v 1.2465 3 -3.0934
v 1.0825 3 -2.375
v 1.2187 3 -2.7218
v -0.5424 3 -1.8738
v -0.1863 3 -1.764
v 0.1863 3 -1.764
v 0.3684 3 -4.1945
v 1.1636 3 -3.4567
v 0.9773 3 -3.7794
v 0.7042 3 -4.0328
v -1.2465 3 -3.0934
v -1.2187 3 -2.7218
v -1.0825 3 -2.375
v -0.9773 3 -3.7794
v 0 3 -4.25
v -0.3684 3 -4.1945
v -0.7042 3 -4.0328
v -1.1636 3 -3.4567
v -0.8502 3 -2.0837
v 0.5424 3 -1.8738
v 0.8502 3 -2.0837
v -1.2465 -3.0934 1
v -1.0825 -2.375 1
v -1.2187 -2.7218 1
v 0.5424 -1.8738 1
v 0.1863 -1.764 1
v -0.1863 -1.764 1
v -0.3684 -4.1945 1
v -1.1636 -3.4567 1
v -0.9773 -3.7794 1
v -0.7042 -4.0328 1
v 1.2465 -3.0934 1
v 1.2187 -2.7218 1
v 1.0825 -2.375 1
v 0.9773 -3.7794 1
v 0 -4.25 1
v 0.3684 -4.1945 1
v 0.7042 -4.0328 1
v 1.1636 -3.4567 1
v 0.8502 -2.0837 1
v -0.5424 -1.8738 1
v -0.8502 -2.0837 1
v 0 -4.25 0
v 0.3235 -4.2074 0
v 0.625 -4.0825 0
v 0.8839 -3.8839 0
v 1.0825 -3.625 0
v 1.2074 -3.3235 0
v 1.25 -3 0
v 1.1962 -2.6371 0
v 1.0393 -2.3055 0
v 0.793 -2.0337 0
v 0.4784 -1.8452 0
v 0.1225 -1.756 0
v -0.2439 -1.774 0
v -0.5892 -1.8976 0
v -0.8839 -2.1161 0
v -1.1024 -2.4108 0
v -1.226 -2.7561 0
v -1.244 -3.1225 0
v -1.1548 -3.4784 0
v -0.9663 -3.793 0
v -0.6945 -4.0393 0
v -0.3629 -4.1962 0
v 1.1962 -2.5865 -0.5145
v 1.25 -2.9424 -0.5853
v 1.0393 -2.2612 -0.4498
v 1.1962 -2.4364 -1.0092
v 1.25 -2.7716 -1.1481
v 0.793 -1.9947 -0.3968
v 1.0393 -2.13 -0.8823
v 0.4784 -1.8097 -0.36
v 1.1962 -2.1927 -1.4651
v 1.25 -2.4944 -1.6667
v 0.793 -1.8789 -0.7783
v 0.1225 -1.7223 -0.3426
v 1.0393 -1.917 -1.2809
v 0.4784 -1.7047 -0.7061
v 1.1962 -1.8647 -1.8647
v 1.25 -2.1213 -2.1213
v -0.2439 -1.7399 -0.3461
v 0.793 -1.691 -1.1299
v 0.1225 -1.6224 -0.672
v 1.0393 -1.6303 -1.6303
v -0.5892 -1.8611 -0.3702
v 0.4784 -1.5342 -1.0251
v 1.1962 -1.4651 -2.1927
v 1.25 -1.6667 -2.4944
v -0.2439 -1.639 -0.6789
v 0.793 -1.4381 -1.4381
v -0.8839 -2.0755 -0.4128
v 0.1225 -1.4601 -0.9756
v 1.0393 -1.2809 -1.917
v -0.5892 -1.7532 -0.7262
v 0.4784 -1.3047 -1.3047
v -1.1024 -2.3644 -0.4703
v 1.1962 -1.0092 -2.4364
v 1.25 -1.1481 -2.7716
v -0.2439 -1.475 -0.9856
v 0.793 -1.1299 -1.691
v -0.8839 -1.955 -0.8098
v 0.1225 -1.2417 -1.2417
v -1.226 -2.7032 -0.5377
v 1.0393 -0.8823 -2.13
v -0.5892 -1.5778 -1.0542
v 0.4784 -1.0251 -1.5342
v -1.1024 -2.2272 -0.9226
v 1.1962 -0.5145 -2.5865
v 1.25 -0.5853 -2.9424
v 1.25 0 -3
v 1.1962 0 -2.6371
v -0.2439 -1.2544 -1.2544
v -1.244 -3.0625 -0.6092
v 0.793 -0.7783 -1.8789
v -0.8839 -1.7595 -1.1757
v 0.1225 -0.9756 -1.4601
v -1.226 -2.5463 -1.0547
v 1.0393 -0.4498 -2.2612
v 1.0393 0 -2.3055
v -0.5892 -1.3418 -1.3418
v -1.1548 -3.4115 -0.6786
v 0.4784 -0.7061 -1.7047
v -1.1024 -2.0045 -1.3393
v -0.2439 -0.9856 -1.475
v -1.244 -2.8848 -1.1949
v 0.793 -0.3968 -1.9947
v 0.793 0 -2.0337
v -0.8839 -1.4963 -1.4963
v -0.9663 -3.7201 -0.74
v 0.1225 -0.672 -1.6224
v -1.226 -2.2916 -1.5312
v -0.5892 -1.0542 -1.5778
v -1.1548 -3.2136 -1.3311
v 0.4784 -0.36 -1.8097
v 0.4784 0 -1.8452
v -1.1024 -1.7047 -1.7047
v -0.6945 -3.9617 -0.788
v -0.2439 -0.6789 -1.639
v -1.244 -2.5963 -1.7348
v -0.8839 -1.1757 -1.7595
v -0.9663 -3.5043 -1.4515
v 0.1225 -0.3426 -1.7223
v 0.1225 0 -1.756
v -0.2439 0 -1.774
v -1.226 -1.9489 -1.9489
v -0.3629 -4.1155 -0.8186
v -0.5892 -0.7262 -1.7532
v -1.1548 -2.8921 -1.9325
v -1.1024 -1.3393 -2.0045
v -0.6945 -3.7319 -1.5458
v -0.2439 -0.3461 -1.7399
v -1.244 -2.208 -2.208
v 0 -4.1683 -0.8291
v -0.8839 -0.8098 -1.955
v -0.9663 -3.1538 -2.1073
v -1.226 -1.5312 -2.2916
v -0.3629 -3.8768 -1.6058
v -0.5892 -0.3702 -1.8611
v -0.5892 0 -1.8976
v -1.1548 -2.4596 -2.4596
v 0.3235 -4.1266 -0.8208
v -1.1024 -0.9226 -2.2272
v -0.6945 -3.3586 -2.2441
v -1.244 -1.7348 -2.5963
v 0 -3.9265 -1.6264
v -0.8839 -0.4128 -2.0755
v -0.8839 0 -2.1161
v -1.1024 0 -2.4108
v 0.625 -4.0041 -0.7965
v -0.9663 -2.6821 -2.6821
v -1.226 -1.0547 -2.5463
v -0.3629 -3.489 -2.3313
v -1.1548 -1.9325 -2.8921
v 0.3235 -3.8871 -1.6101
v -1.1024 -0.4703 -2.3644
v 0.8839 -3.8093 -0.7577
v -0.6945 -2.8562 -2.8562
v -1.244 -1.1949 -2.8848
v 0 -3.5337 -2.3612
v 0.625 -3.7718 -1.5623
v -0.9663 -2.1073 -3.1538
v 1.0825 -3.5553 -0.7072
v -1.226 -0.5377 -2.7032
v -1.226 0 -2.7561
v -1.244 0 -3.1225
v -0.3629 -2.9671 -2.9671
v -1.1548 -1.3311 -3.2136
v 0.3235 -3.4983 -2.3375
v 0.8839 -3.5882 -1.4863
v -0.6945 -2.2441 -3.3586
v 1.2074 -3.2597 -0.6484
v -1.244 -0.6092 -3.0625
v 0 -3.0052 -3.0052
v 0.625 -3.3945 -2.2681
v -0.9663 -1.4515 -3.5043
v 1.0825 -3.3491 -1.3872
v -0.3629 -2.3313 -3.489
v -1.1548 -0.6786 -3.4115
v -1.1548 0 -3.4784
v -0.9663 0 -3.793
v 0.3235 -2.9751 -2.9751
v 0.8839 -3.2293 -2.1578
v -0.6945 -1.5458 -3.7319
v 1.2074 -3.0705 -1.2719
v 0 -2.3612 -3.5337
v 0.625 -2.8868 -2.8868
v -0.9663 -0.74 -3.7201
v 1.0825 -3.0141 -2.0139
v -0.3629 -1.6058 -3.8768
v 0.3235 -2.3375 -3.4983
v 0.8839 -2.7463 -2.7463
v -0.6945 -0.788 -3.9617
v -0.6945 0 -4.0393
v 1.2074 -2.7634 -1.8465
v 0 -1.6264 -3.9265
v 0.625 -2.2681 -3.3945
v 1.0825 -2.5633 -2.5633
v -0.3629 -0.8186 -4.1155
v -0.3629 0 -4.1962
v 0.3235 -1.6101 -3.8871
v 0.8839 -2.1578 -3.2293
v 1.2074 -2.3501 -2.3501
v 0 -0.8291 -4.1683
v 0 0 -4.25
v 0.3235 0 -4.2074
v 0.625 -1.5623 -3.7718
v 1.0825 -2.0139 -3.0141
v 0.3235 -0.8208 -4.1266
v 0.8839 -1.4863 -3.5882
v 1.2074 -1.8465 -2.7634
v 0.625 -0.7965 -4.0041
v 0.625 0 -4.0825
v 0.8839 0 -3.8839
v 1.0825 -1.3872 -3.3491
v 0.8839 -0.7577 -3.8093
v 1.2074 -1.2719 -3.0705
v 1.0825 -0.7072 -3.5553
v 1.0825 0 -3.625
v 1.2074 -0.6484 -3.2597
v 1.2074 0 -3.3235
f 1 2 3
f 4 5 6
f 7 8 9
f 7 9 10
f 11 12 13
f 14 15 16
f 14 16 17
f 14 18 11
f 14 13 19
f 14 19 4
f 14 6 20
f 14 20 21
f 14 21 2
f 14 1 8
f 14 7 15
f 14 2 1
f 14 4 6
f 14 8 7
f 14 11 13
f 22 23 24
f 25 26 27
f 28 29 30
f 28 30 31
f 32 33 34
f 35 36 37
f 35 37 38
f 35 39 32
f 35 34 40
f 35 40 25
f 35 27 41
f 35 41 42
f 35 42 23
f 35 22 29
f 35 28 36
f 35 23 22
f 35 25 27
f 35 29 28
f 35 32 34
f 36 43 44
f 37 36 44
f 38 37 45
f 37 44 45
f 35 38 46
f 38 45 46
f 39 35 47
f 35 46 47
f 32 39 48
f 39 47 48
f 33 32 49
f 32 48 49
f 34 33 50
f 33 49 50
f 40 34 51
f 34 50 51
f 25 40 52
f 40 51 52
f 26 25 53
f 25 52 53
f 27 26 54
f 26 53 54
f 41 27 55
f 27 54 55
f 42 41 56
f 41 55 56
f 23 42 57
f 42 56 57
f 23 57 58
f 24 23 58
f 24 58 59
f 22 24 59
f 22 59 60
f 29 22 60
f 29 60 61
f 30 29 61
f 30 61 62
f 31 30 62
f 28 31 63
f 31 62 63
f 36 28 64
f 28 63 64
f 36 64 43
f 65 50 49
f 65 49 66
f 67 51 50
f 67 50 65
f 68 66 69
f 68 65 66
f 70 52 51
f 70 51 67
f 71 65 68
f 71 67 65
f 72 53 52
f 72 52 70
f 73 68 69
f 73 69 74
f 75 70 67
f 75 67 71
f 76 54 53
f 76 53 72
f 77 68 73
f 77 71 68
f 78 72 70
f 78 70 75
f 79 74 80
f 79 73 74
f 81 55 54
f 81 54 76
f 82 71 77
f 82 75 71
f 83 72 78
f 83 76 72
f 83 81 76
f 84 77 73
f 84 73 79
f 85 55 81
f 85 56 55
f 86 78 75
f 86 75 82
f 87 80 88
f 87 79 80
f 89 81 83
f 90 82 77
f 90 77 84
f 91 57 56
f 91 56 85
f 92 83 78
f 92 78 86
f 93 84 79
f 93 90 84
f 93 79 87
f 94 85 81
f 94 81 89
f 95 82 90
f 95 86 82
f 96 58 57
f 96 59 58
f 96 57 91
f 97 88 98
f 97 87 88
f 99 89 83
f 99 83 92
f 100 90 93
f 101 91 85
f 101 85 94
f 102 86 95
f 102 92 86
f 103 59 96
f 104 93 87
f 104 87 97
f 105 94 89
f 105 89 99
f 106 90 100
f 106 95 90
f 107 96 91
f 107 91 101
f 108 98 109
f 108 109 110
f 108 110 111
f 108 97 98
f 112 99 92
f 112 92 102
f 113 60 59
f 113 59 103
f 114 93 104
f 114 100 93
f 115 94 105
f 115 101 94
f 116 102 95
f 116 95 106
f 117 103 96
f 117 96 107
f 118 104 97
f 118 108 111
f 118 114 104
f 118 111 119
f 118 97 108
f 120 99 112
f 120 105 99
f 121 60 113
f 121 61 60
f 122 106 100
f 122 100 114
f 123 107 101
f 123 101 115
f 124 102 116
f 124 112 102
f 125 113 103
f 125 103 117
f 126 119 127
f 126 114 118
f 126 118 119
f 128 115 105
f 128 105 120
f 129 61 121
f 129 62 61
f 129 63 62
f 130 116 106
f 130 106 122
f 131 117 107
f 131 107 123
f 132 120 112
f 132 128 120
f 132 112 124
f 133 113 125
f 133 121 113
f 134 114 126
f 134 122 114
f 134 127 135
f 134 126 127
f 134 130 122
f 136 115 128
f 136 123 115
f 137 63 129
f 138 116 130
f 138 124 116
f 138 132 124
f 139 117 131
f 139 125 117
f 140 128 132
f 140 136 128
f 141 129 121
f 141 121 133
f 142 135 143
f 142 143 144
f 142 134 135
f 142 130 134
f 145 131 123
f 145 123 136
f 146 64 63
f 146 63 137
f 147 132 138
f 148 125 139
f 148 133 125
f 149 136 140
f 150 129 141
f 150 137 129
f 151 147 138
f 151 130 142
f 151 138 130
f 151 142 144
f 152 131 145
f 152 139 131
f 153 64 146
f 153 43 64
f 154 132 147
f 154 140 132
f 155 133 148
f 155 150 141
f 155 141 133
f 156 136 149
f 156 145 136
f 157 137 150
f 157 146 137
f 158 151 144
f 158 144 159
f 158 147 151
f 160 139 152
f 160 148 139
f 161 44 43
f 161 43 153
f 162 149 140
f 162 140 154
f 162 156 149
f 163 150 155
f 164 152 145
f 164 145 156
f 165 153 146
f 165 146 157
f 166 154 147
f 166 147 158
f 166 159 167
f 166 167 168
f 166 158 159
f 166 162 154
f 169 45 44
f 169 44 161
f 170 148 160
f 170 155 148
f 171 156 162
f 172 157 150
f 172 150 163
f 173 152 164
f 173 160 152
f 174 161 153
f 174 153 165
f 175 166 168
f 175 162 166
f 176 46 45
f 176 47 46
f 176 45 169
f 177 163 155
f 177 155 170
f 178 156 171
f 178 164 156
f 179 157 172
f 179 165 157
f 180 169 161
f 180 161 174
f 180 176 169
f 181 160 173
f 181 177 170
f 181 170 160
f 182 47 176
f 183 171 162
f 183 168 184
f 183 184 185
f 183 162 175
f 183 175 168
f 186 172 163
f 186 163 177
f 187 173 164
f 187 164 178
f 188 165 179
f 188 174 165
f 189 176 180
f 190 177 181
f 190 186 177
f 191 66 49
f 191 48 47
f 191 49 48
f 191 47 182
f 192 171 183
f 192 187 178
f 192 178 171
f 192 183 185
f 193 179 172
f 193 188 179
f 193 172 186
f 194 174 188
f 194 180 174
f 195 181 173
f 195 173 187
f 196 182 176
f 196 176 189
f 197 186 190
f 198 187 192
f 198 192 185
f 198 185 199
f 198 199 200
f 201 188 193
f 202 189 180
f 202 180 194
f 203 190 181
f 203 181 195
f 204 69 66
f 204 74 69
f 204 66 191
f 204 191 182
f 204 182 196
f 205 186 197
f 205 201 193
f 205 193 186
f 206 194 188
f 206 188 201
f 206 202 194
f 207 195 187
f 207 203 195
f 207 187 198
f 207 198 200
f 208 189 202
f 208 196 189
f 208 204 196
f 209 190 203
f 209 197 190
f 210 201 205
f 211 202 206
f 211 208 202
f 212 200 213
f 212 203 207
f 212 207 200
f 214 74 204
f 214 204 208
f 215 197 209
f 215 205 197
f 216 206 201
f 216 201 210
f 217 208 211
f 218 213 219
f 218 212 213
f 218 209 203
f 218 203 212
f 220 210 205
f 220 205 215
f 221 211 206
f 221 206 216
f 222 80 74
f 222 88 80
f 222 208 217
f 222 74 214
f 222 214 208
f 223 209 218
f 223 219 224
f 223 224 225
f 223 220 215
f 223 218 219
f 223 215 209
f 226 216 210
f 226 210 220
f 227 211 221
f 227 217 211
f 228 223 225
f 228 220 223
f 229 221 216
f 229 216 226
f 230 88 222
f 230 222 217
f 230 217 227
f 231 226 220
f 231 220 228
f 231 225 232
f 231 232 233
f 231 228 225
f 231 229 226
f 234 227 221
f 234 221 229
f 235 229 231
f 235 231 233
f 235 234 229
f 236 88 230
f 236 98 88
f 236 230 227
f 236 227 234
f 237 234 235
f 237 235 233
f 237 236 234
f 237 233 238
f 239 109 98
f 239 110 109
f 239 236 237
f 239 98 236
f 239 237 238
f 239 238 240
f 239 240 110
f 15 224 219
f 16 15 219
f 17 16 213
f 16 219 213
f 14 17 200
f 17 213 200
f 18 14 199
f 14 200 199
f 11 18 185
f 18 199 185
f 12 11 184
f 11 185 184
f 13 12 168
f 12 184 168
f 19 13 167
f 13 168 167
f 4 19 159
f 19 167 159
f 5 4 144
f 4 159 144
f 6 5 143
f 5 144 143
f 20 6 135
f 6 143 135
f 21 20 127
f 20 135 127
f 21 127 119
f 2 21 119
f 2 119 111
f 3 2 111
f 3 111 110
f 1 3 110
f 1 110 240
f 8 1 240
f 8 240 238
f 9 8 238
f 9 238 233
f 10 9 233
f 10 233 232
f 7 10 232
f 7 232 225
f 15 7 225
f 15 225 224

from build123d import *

# Parameters (mm, degrees)
ESQUISSE5_R        = 1.25
R_VOLUTION1_ANGLE  = 90
ESQUISSE6_R        = 1.25
BOSS_EXTRU_3_DEPTH = 1
ESQUISSE7_R        = 1.25
BOSS_EXTRU_4_DEPTH = 3


with BuildPart() as part:
    # Esquisse5 → Révolution1 (revolve)
    with BuildSketch(Plane.XY):
        with Locations((0, -3)):
            Circle(ESQUISSE5_R)
    revolve(axis=Axis((-1.070799248, 0, 0), (1, 0, 0)), revolution_arc=R_VOLUTION1_ANGLE)

    # Esquisse6 → Boss.-Extru.3 (add)
    with BuildSketch(Plane.XY):
        with Locations(Location((0, -3, 0), (0, 0, 270))):
            Circle(ESQUISSE6_R)
    extrude(amount=BOSS_EXTRU_3_DEPTH)

    # Esquisse7 → Boss.-Extru.4 (add)
    with BuildSketch(Plane(origin=(0, 0, 0), x_dir=(1, 0, 0), z_dir=(0, 1, 0))):
        with Locations(Location((0, 3, 0), (0, 0, 90))):
            Circle(ESQUISSE7_R)
    extrude(amount=BOSS_EXTRU_4_DEPTH)


solid = part.part
